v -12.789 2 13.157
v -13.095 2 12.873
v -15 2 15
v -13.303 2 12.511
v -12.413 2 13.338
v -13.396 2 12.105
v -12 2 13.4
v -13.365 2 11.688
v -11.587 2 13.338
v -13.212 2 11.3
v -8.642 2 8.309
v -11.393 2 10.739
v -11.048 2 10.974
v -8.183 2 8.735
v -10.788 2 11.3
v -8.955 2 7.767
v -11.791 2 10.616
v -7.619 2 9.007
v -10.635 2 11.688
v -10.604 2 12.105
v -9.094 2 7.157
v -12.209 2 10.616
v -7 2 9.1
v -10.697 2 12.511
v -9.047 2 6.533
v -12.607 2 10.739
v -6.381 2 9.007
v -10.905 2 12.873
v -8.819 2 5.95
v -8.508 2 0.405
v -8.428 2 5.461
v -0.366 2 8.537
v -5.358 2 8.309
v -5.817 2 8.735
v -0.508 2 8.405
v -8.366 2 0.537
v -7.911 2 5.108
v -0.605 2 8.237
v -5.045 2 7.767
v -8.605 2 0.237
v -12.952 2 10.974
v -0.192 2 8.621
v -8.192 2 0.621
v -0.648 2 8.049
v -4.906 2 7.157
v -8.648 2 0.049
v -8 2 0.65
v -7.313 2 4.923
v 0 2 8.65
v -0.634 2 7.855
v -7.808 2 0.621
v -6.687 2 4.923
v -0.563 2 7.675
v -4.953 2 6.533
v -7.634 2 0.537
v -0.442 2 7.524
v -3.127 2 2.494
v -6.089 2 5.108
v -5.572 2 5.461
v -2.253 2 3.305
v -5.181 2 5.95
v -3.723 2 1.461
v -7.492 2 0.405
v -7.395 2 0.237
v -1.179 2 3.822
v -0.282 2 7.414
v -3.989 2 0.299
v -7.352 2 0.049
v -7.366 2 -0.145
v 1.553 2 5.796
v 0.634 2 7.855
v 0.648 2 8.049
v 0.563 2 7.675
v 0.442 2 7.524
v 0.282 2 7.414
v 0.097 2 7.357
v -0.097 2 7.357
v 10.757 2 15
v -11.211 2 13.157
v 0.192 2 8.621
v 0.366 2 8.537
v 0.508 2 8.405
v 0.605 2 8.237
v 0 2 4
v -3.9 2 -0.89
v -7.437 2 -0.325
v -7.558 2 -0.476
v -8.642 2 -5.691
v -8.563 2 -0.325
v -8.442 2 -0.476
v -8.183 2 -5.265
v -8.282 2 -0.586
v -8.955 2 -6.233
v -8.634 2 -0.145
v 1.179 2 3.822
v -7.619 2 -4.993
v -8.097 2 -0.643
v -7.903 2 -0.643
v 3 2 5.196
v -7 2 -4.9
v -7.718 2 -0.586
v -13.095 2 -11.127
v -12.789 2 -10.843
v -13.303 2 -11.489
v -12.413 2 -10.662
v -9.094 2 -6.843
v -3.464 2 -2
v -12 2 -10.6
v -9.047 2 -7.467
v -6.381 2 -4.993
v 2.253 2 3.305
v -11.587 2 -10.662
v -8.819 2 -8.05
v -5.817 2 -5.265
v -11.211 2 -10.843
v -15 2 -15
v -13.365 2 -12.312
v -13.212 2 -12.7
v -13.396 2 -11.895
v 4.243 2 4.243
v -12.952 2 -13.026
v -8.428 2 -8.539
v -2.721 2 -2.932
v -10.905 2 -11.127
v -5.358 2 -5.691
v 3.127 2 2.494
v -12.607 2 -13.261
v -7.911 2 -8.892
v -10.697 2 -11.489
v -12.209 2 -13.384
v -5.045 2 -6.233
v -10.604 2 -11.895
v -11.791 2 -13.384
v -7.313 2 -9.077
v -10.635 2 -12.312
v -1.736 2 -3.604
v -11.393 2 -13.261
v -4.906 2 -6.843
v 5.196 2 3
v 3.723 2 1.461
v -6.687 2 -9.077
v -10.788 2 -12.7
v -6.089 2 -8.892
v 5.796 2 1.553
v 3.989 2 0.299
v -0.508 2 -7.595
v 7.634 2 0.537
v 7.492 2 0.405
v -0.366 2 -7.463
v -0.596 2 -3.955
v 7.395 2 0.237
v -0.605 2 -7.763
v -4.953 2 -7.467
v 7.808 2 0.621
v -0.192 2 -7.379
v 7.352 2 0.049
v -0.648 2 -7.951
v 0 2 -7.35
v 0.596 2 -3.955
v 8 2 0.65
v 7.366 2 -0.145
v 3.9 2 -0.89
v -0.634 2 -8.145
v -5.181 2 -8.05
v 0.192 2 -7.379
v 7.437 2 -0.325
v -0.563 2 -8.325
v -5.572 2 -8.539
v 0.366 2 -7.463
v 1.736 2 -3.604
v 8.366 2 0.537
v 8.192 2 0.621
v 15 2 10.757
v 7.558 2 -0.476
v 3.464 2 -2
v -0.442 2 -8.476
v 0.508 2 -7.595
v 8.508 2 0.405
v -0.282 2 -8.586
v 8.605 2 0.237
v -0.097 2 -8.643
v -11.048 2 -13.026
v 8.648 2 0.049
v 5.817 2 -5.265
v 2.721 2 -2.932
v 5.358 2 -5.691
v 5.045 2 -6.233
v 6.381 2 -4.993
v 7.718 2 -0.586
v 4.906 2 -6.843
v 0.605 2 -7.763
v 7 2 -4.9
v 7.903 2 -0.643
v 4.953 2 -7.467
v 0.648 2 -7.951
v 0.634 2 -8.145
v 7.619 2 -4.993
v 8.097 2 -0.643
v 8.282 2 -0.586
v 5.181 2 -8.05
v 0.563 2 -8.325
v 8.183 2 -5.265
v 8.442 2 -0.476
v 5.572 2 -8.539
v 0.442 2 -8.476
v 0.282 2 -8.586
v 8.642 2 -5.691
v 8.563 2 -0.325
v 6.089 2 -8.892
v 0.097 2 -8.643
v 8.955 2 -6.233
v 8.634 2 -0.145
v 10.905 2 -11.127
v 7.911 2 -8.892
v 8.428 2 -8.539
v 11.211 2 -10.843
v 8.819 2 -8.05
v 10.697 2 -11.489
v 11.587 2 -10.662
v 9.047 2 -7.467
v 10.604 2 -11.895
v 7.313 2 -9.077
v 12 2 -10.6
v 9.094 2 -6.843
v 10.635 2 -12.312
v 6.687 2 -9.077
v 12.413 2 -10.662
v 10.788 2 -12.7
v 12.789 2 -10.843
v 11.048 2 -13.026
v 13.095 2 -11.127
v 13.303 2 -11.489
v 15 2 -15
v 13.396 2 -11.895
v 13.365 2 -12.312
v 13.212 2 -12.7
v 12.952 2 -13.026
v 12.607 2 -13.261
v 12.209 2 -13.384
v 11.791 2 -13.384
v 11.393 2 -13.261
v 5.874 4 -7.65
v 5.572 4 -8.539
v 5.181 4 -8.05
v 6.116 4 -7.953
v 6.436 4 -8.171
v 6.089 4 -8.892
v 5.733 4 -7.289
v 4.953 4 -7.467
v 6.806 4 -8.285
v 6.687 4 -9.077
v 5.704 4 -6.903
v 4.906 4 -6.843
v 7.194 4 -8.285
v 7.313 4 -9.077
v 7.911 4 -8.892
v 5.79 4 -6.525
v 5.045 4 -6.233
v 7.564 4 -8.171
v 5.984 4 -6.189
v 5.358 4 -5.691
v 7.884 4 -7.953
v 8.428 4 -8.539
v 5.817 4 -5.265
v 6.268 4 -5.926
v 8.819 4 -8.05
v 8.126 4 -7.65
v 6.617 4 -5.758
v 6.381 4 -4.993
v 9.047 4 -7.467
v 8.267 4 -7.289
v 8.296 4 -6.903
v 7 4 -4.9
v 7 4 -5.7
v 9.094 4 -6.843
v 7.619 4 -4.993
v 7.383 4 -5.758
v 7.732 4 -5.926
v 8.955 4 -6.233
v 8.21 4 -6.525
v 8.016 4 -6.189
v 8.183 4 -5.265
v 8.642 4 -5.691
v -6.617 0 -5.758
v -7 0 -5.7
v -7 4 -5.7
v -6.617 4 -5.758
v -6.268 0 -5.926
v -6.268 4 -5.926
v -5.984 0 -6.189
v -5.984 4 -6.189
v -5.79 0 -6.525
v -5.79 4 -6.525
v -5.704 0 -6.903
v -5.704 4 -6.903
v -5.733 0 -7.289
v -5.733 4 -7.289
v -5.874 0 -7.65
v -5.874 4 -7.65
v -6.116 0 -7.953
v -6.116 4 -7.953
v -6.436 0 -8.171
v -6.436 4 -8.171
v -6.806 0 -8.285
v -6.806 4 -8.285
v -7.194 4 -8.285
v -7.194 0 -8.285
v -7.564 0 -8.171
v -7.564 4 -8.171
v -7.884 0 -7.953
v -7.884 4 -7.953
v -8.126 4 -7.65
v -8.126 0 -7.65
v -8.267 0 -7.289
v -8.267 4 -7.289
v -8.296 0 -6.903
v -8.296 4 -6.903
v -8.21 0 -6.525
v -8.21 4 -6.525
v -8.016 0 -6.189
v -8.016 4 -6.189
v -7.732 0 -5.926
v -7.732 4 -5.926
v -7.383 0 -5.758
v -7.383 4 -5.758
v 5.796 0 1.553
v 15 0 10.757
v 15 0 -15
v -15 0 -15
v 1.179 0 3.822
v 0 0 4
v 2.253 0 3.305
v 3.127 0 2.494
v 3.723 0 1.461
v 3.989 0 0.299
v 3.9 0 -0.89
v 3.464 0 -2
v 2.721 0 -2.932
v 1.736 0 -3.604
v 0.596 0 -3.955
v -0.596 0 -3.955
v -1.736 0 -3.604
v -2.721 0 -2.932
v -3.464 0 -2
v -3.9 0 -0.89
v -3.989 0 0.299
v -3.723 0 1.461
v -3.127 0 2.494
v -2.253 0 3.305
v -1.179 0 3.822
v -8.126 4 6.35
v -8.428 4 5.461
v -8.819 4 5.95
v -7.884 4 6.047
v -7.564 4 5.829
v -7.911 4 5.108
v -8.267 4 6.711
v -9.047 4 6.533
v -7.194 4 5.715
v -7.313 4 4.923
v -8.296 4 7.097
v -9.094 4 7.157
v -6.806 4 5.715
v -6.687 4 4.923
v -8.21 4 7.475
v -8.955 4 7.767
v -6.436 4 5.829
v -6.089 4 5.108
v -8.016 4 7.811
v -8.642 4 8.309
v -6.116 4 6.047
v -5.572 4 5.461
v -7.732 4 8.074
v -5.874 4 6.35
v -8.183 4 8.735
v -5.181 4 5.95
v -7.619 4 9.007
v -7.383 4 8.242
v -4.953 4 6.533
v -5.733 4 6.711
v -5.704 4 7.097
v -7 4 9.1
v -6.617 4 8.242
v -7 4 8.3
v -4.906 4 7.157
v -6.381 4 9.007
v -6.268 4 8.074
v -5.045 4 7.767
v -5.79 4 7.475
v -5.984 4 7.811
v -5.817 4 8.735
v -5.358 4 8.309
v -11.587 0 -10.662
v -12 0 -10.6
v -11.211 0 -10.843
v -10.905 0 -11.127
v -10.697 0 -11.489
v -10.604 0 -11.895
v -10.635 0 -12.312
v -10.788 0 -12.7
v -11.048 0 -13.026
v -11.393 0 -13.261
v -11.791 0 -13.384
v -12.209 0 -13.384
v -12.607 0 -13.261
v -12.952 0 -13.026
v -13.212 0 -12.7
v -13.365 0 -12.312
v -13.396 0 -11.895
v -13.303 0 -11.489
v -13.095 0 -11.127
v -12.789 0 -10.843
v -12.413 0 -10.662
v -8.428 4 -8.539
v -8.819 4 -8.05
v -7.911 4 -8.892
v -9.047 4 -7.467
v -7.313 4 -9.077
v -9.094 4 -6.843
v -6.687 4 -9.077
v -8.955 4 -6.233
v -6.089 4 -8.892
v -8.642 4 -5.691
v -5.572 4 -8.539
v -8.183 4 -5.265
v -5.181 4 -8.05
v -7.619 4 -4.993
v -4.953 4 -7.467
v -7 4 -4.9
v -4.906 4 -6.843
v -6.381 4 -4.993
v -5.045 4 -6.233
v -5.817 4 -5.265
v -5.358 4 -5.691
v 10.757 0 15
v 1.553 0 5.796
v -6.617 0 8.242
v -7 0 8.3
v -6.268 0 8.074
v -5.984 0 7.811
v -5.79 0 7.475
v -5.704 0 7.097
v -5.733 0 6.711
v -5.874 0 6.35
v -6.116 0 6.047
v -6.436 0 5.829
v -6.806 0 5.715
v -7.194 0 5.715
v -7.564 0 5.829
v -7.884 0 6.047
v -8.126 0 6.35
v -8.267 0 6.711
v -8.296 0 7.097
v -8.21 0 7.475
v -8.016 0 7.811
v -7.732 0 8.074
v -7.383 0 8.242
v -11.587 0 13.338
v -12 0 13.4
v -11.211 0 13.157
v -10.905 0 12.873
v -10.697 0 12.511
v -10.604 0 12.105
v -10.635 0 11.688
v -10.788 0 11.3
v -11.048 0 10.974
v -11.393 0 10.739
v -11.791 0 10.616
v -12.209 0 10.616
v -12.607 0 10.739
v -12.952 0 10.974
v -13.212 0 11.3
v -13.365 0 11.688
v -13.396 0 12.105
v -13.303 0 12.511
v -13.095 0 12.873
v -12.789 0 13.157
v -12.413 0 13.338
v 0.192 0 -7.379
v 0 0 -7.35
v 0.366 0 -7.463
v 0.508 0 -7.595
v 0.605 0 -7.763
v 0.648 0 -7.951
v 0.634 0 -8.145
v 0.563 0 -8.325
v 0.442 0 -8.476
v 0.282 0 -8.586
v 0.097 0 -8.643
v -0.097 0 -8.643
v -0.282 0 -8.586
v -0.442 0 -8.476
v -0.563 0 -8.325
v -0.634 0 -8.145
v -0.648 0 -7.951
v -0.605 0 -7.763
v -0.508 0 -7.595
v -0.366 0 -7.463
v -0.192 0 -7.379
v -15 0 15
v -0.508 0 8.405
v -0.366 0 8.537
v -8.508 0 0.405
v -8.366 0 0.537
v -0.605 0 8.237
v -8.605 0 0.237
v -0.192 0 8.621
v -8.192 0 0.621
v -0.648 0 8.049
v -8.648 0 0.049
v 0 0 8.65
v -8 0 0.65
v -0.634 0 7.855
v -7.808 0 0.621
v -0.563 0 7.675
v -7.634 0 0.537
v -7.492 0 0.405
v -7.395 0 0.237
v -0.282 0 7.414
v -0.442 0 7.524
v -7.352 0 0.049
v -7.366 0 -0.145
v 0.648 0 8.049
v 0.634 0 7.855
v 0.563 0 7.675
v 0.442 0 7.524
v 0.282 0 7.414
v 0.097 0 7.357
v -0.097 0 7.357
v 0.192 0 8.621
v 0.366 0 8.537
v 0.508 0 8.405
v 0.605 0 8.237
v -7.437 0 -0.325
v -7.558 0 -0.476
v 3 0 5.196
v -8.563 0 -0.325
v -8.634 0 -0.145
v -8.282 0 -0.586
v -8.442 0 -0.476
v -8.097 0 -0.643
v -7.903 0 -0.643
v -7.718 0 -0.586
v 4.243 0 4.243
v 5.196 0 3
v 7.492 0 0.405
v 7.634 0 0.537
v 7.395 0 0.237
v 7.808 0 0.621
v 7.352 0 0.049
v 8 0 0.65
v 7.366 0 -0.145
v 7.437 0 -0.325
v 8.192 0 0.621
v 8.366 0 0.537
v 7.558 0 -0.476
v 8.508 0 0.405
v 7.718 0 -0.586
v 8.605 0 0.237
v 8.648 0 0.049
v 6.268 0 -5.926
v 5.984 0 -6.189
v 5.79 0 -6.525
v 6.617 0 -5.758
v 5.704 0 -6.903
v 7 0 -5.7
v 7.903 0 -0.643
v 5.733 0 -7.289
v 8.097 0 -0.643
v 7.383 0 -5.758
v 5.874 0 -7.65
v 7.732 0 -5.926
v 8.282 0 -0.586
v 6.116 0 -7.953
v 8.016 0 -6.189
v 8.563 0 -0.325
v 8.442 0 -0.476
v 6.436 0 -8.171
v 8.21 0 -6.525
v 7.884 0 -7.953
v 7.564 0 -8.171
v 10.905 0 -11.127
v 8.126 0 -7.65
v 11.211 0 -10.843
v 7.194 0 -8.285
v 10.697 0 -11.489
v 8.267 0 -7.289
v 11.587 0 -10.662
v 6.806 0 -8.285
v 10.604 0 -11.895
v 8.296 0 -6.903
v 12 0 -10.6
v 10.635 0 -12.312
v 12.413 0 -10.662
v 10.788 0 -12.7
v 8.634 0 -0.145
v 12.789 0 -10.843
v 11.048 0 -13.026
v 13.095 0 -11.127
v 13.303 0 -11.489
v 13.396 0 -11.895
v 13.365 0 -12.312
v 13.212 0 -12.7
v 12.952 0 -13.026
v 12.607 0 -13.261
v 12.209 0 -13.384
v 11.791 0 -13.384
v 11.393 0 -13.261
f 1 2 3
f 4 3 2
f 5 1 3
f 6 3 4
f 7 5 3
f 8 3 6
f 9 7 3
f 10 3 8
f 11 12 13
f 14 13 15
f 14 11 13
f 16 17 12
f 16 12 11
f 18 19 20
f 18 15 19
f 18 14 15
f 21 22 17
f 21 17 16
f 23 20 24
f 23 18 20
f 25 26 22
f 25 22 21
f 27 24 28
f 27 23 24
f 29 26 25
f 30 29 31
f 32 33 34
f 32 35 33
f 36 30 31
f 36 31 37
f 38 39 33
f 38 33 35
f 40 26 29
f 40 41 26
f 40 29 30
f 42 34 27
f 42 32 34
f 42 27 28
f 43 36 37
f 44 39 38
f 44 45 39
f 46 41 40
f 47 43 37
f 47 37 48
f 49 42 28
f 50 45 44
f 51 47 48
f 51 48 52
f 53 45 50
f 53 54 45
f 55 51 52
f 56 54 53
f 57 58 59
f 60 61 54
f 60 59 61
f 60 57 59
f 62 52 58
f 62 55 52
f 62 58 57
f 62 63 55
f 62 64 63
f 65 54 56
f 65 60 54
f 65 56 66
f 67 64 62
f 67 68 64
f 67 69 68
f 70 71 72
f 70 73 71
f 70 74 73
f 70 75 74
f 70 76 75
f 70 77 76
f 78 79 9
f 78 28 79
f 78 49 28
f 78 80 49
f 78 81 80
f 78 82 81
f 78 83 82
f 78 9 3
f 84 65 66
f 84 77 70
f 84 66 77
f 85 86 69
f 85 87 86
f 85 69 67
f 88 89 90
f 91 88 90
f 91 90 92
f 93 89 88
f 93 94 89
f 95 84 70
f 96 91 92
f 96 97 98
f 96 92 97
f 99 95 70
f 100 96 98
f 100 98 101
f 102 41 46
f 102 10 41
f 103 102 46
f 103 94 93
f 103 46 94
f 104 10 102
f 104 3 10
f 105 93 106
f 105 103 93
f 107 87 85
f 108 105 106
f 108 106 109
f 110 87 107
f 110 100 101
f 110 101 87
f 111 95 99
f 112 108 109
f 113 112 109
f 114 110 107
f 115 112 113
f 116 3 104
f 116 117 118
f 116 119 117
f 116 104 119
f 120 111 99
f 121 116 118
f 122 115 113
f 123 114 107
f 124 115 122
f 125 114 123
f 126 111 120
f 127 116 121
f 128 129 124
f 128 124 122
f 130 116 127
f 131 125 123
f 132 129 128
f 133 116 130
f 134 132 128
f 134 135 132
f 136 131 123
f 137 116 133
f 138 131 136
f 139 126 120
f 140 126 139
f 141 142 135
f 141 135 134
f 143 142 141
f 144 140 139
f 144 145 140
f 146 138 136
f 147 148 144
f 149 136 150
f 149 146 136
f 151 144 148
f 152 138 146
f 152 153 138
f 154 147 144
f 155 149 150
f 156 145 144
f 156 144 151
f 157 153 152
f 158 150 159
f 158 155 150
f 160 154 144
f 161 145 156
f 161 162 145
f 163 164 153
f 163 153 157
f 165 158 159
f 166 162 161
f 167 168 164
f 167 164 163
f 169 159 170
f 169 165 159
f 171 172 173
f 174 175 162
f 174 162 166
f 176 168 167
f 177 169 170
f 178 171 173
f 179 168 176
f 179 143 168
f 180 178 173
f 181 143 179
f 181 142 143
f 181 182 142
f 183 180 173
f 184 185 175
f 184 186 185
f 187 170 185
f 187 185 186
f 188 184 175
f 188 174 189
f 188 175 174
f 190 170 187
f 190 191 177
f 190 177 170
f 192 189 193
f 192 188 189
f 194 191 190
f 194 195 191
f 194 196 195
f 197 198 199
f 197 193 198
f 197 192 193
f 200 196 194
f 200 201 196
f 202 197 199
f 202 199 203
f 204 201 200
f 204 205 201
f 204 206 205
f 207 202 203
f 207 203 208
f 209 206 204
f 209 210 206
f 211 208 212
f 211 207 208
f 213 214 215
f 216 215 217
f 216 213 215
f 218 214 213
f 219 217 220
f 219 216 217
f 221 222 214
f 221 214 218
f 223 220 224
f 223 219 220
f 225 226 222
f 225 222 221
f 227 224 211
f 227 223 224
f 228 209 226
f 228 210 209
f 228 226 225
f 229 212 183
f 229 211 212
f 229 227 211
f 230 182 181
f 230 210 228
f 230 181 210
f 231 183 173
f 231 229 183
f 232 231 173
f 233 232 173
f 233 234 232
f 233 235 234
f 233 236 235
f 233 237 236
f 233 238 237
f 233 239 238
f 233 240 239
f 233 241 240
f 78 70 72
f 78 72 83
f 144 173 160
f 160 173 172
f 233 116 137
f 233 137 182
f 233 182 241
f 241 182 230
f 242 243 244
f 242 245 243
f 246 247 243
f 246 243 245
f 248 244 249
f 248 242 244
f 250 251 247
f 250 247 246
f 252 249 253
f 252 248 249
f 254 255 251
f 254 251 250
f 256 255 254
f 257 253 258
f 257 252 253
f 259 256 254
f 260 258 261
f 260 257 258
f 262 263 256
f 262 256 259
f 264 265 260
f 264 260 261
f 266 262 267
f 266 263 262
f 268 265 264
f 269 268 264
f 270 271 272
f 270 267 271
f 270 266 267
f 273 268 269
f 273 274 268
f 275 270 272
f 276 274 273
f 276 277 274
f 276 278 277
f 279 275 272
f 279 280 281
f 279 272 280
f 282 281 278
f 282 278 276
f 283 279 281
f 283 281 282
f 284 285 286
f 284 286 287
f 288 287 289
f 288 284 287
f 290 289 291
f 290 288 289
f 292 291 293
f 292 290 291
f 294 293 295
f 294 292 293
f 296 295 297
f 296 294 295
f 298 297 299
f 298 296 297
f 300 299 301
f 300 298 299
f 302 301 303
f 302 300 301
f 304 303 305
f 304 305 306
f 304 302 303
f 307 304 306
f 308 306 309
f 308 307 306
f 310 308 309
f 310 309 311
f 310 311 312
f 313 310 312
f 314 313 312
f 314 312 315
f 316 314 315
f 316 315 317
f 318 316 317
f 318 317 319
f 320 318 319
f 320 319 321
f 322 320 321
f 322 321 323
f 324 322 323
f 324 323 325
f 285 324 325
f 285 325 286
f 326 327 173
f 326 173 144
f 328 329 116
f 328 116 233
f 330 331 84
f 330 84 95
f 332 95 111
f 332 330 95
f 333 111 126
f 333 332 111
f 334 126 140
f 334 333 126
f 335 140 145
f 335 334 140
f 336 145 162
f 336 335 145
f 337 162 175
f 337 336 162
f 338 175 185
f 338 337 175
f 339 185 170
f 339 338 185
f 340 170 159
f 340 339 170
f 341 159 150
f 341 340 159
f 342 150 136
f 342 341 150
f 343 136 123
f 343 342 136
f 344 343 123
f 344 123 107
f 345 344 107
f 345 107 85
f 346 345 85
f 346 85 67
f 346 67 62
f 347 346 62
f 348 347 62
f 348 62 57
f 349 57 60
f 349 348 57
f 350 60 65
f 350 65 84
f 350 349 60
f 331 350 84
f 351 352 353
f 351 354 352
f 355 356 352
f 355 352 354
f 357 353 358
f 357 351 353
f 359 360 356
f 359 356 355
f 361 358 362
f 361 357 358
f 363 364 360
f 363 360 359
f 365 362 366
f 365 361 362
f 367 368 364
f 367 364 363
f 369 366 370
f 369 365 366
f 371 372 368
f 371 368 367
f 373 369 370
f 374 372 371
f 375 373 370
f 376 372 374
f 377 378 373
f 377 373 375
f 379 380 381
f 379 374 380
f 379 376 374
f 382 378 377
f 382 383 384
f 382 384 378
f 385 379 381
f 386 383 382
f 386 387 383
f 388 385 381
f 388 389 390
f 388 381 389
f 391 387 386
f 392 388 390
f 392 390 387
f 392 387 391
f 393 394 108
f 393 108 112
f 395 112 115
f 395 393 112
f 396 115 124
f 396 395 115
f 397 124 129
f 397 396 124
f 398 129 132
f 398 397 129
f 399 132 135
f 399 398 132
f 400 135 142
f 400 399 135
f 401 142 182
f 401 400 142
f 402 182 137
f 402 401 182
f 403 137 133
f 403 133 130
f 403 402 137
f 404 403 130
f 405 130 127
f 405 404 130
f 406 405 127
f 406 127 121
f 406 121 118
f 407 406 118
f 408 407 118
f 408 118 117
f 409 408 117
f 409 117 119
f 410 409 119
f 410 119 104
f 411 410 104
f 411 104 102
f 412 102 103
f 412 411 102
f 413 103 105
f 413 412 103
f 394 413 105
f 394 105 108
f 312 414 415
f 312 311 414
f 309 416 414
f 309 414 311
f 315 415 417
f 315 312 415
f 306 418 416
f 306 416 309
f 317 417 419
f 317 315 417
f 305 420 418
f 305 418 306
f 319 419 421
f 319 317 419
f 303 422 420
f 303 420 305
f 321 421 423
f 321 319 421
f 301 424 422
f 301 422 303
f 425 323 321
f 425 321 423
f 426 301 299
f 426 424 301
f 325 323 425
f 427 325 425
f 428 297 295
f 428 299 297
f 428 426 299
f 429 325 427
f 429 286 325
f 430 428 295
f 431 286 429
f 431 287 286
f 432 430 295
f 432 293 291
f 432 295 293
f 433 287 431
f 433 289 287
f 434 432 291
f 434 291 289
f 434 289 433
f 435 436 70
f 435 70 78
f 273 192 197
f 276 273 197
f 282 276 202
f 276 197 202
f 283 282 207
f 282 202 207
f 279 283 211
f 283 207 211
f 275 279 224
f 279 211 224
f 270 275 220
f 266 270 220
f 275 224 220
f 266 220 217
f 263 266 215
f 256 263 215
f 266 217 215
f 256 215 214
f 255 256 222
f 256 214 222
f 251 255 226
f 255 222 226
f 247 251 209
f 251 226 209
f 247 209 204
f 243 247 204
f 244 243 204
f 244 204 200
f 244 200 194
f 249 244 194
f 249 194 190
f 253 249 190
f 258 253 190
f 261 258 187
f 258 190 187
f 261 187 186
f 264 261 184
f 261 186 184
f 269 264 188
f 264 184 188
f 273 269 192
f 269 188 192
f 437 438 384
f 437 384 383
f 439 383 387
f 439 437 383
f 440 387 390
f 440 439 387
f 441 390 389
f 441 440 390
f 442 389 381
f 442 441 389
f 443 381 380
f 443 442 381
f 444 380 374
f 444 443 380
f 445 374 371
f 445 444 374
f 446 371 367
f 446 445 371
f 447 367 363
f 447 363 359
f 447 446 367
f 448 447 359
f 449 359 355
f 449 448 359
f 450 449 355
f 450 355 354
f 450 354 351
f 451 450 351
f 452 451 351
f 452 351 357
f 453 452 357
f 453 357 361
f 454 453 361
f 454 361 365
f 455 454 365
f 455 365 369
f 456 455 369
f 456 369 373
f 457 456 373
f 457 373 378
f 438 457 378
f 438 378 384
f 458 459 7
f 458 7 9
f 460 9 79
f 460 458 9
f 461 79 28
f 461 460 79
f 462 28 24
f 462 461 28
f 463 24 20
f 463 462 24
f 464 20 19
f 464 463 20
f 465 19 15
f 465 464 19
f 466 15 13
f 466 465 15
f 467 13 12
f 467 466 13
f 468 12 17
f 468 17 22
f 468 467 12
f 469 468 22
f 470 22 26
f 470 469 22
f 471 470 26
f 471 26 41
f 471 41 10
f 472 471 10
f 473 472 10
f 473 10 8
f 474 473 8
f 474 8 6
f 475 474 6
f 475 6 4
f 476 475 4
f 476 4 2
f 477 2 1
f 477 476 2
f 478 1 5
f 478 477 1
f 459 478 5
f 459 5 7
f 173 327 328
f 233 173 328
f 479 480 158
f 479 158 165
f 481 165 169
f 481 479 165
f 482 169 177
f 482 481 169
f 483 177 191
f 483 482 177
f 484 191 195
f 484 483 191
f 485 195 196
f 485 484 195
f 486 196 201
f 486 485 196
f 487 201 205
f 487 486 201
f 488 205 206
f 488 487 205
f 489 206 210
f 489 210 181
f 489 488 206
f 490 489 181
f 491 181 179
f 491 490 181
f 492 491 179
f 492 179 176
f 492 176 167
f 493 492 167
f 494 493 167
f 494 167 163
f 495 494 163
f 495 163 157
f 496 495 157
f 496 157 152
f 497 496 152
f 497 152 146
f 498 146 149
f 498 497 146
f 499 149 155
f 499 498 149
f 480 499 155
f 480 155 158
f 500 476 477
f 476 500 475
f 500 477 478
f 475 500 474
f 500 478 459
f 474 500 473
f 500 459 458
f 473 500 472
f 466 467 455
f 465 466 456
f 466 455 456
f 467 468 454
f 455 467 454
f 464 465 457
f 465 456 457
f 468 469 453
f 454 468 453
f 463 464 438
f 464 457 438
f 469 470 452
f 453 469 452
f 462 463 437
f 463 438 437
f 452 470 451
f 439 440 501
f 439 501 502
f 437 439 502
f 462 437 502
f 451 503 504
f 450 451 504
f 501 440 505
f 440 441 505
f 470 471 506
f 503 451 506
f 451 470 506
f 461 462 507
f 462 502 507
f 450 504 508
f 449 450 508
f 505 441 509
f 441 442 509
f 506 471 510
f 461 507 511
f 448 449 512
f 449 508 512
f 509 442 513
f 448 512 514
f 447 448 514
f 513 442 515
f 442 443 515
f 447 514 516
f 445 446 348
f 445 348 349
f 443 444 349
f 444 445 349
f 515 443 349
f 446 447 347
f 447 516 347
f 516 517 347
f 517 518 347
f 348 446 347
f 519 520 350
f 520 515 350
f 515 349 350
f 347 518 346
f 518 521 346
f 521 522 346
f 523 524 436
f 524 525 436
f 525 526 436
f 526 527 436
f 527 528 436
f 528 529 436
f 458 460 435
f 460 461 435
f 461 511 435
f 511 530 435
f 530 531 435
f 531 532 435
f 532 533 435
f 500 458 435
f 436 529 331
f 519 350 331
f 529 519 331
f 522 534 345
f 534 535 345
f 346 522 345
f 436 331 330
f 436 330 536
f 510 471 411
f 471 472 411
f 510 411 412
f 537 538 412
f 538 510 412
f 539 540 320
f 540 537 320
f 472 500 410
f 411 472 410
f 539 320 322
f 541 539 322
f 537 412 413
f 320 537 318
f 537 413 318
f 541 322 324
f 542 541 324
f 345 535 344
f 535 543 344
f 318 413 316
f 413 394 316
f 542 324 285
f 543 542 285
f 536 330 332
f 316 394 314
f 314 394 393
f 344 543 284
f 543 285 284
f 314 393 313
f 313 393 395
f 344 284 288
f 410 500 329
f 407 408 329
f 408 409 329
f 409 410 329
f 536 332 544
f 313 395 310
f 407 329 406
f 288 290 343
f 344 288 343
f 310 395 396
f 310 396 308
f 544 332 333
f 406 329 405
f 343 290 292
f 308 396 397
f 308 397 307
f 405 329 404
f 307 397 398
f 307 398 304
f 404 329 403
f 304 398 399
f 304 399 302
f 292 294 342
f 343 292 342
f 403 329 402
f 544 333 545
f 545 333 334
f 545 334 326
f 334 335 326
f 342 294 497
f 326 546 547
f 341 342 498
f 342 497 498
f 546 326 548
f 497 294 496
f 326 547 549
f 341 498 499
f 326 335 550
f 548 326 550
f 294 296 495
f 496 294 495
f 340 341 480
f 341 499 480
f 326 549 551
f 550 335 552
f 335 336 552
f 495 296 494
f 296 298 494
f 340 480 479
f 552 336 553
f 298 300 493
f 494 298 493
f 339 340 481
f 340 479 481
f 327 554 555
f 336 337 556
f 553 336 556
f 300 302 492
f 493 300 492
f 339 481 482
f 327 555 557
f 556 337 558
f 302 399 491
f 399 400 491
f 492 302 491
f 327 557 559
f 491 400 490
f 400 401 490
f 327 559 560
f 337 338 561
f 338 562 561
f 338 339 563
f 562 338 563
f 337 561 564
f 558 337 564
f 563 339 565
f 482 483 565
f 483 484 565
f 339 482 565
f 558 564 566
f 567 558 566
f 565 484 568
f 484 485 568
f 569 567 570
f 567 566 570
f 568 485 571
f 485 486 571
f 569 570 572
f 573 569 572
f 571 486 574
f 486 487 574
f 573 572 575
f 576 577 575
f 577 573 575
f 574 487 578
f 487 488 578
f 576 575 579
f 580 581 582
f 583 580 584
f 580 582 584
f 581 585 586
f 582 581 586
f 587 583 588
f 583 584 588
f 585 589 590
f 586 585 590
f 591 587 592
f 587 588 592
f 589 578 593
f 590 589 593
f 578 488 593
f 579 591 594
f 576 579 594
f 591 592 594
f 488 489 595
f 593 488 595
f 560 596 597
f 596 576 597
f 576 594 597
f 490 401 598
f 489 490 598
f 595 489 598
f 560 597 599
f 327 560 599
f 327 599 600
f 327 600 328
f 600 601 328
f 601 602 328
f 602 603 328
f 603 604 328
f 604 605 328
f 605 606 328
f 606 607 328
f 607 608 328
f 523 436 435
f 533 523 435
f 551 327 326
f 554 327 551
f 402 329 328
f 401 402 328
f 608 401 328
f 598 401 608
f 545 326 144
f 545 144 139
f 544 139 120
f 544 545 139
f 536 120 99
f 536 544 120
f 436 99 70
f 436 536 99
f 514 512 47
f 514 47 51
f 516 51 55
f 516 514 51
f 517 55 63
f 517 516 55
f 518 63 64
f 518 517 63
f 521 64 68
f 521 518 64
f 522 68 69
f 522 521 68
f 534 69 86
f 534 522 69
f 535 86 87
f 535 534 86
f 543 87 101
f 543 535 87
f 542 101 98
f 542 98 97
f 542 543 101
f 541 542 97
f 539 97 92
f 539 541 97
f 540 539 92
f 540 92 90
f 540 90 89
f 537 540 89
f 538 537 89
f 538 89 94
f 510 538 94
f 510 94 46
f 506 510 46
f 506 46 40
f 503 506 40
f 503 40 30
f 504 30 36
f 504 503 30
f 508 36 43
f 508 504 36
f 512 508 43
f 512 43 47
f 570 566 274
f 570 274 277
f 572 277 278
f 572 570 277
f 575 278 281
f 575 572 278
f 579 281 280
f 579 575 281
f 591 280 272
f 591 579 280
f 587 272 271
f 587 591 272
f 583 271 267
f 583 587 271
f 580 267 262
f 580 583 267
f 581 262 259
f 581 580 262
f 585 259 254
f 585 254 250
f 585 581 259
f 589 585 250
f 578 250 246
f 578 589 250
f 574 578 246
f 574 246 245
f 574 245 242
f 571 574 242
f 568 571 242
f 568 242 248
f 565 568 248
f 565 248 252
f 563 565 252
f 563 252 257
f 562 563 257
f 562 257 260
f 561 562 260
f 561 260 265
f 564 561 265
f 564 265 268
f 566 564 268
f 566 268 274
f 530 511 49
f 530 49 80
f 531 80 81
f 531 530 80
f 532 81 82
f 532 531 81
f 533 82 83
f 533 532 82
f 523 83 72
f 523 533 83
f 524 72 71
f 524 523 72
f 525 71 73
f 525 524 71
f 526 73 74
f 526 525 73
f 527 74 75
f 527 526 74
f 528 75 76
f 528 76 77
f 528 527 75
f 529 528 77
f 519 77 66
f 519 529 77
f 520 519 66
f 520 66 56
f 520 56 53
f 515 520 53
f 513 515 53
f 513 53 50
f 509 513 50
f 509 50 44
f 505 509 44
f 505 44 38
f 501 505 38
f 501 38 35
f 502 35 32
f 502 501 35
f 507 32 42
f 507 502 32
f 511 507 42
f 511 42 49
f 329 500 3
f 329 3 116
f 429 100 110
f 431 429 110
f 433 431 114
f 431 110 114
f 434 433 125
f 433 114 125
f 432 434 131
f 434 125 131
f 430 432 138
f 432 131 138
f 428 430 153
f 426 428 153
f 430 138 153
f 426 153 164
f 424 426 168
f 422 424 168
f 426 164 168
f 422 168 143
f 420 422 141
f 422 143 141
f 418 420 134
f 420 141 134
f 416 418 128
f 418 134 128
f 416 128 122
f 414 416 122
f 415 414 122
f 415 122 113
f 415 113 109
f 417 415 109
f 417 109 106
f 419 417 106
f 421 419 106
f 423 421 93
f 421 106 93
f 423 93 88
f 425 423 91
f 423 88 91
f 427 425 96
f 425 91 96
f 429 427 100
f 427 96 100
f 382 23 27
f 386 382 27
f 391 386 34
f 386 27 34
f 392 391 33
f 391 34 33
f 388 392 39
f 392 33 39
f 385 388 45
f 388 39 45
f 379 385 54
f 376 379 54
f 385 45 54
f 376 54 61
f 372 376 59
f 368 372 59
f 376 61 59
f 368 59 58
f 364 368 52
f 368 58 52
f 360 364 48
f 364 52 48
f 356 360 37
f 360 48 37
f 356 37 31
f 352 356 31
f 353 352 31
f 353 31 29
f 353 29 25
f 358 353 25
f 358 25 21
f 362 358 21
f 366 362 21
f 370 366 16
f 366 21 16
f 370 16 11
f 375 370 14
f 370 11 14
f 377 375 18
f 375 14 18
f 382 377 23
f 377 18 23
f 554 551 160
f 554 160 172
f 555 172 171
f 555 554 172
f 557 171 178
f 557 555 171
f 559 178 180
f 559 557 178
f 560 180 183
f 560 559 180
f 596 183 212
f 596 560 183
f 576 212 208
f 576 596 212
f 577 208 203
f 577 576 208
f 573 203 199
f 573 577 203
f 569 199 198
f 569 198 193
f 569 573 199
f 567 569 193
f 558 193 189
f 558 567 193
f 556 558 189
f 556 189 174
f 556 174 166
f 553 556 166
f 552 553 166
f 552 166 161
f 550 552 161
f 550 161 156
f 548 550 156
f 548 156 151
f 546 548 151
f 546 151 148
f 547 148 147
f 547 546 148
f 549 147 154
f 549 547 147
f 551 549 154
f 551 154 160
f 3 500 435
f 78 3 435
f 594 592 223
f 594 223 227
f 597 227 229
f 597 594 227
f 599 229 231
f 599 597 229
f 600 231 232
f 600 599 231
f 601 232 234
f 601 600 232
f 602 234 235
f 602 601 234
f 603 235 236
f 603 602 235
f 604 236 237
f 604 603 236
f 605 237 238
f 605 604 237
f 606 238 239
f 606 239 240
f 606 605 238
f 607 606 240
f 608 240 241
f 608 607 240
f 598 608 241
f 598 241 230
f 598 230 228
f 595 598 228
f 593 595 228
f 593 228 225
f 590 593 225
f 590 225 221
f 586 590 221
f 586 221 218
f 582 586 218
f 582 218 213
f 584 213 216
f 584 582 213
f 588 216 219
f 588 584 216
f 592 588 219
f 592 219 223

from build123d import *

# Parameters (mm, degrees)
SKETCH_1_W          = 30
SKETCH_1_H          = 30
SKETCH_1_R          = 0.65
SKETCH_1_R_2        = 4
SKETCH_1_R_3        = 1.4
EXTRUDE_1_DEPTH     = 2
SKETCH_2_R          = 2.1
SKETCH_2_R_2        = 1.3
EXTRUDE_3_DEPTH     = 2
CUT_EXTRUDE_START   = -2
SKETCH_2_6_R        = 1.3
SKETCH_2_6_R_2      = 1.4
SKETCH_2_6_R_3      = 2.1
CUT_EXTRUDE_2_DEPTH = 2


with BuildPart() as part:
    # 草图1 → 凸台-拉伸1 (new body)
    with BuildSketch(Plane(origin=(0, 0, 0), x_dir=(1, 0, 0), z_dir=(0, 1, 0))):
        Rectangle(SKETCH_1_W, SKETCH_1_H)
        with Locations(Location((8, 0, 0), (0, 0, 270))):
            Circle(SKETCH_1_R, mode=Mode.SUBTRACT)
        with Locations(Location((0, -8, 0), (0, 0, 270))):
            Circle(SKETCH_1_R, mode=Mode.SUBTRACT)
        with Locations(Location((-8, 0, 0), (0, 0, 270))):
            Circle(SKETCH_1_R, mode=Mode.SUBTRACT)
        with Locations(Location((0, 8, 0), (0, 0, 270))):
            Circle(SKETCH_1_R, mode=Mode.SUBTRACT)
        with Locations(Location((0, 0, 0), (0, 0, 270))):
            Circle(SKETCH_1_R_2, mode=Mode.SUBTRACT)
        with Locations(Location((12, 12, 0), (0, 0, 270))):
            Circle(SKETCH_1_R_3, mode=Mode.SUBTRACT)
        with Locations(Location((-12, 12, 0), (0, 0, 270))):
            Circle(SKETCH_1_R_3, mode=Mode.SUBTRACT)
        with Locations(Location((12, -12, 0), (0, 0, 270))):
            Circle(SKETCH_1_R_3, mode=Mode.SUBTRACT)
        with Locations(Location((-12, -12, 0), (0, 0, 270))):
            Circle(SKETCH_1_R_3, mode=Mode.SUBTRACT)
    extrude(amount=EXTRUDE_1_DEPTH)

    # 草图2 → 凸台-拉伸3 (add)
    # profile 1 of 3: a face of its own
    with BuildSketch(Plane(origin=(0, 2, 0), x_dir=(1, 0, 0), z_dir=(0, 1, 0))):
        with Locations(Location((-7, -7, 0), (0, 0, 270))):
            Circle(SKETCH_2_R)
        with Locations(Location((-7, -7, 0), (0, 0, 270))):
            Circle(SKETCH_2_R_2, mode=Mode.SUBTRACT)
    # profile 2 of 3: a face of its own
    with BuildSketch(Plane(origin=(0, 2, 0), x_dir=(1, 0, 0), z_dir=(0, 1, 0))):
        with Locations(Location((-7, 7, 0), (0, 0, 270))):
            Circle(SKETCH_2_R)
        with Locations(Location((-7, 7, 0), (0, 0, 270))):
            Circle(SKETCH_2_R_2, mode=Mode.SUBTRACT)
    # profile 3 of 3: a face of its own
    with BuildSketch(Plane(origin=(0, 2, 0), x_dir=(1, 0, 0), z_dir=(0, 1, 0))):
        with Locations(Location((7, 7, 0), (0, 0, 270))):
            Circle(SKETCH_2_R)
        with Locations(Location((7, 7, 0), (0, 0, 270))):
            Circle(SKETCH_2_R_2, mode=Mode.SUBTRACT)
    extrude(amount=EXTRUDE_3_DEPTH)

    # 草图2<6> → 切除-拉伸2 (cut)
    # profile 1 of 6: a face of its own
    with BuildSketch(Plane(origin=(0, 2, 0), x_dir=(1, 0, 0), z_dir=(0, 1, 0)).offset(CUT_EXTRUDE_START)):
        with Locations(Location((-7, 7, 0), (0, 0, 270))):
            Circle(SKETCH_2_6_R)
    # profile 2 of 6: a face of its own
    with BuildSketch(Plane(origin=(0, 2, 0), x_dir=(1, 0, 0), z_dir=(0, 1, 0)).offset(CUT_EXTRUDE_START)):
        with Locations(Location((-7, -7, 0), (0, 0, 270))):
            Circle(SKETCH_2_6_R)
    # profile 3 of 6: a face of its own
    with BuildSketch(Plane(origin=(0, 2, 0), x_dir=(1, 0, 0), z_dir=(0, 1, 0)).offset(CUT_EXTRUDE_START)):
        with Locations(Location((7, 7, 0), (0, 0, 270))):
            Circle(SKETCH_2_6_R)
    # profile 4 of 6: a face of its own
    with BuildSketch(Plane(origin=(0, 2, 0), x_dir=(1, 0, 0), z_dir=(0, 1, 0)).offset(CUT_EXTRUDE_START)):
        with BuildLine():
            Line((15, -10.757359313), (5.795554958, -1.552914271))
            ThreePointArc((5.795554958, -1.552914271), (4.242640687, -4.242640687), (1.552914271, -5.795554958))
            Line((1.552914271, -5.795554958), (10.757359313, -15))
            Line((10.757359313, -15), (15, -15))
            Line((15, -15), (15, -10.757359313))
        make_face()
        with Locations((12, -12)):
            Circle(SKETCH_2_6_R_2, mode=Mode.SUBTRACT)
        with Locations((7, -7)):
            Circle(SKETCH_2_6_R_3, mode=Mode.SUBTRACT)
    # profile 5 of 6: a face of its own
    with BuildSketch(Plane(origin=(0, 2, 0), x_dir=(1, 0, 0), z_dir=(0, 1, 0)).offset(CUT_EXTRUDE_START)):
        with Locations((7, -7)):
            Circle(SKETCH_2_6_R_3)
        with Locations((7, -7)):
            Circle(SKETCH_2_6_R, mode=Mode.SUBTRACT)
    # profile 6 of 6: a face of its own
    with BuildSketch(Plane(origin=(0, 2, 0), x_dir=(1, 0, 0), z_dir=(0, 1, 0)).offset(CUT_EXTRUDE_START)):
        with Locations((7, -7)):
            Circle(SKETCH_2_6_R)
    extrude(amount=CUT_EXTRUDE_2_DEPTH, mode=Mode.SUBTRACT)


solid = part.part
